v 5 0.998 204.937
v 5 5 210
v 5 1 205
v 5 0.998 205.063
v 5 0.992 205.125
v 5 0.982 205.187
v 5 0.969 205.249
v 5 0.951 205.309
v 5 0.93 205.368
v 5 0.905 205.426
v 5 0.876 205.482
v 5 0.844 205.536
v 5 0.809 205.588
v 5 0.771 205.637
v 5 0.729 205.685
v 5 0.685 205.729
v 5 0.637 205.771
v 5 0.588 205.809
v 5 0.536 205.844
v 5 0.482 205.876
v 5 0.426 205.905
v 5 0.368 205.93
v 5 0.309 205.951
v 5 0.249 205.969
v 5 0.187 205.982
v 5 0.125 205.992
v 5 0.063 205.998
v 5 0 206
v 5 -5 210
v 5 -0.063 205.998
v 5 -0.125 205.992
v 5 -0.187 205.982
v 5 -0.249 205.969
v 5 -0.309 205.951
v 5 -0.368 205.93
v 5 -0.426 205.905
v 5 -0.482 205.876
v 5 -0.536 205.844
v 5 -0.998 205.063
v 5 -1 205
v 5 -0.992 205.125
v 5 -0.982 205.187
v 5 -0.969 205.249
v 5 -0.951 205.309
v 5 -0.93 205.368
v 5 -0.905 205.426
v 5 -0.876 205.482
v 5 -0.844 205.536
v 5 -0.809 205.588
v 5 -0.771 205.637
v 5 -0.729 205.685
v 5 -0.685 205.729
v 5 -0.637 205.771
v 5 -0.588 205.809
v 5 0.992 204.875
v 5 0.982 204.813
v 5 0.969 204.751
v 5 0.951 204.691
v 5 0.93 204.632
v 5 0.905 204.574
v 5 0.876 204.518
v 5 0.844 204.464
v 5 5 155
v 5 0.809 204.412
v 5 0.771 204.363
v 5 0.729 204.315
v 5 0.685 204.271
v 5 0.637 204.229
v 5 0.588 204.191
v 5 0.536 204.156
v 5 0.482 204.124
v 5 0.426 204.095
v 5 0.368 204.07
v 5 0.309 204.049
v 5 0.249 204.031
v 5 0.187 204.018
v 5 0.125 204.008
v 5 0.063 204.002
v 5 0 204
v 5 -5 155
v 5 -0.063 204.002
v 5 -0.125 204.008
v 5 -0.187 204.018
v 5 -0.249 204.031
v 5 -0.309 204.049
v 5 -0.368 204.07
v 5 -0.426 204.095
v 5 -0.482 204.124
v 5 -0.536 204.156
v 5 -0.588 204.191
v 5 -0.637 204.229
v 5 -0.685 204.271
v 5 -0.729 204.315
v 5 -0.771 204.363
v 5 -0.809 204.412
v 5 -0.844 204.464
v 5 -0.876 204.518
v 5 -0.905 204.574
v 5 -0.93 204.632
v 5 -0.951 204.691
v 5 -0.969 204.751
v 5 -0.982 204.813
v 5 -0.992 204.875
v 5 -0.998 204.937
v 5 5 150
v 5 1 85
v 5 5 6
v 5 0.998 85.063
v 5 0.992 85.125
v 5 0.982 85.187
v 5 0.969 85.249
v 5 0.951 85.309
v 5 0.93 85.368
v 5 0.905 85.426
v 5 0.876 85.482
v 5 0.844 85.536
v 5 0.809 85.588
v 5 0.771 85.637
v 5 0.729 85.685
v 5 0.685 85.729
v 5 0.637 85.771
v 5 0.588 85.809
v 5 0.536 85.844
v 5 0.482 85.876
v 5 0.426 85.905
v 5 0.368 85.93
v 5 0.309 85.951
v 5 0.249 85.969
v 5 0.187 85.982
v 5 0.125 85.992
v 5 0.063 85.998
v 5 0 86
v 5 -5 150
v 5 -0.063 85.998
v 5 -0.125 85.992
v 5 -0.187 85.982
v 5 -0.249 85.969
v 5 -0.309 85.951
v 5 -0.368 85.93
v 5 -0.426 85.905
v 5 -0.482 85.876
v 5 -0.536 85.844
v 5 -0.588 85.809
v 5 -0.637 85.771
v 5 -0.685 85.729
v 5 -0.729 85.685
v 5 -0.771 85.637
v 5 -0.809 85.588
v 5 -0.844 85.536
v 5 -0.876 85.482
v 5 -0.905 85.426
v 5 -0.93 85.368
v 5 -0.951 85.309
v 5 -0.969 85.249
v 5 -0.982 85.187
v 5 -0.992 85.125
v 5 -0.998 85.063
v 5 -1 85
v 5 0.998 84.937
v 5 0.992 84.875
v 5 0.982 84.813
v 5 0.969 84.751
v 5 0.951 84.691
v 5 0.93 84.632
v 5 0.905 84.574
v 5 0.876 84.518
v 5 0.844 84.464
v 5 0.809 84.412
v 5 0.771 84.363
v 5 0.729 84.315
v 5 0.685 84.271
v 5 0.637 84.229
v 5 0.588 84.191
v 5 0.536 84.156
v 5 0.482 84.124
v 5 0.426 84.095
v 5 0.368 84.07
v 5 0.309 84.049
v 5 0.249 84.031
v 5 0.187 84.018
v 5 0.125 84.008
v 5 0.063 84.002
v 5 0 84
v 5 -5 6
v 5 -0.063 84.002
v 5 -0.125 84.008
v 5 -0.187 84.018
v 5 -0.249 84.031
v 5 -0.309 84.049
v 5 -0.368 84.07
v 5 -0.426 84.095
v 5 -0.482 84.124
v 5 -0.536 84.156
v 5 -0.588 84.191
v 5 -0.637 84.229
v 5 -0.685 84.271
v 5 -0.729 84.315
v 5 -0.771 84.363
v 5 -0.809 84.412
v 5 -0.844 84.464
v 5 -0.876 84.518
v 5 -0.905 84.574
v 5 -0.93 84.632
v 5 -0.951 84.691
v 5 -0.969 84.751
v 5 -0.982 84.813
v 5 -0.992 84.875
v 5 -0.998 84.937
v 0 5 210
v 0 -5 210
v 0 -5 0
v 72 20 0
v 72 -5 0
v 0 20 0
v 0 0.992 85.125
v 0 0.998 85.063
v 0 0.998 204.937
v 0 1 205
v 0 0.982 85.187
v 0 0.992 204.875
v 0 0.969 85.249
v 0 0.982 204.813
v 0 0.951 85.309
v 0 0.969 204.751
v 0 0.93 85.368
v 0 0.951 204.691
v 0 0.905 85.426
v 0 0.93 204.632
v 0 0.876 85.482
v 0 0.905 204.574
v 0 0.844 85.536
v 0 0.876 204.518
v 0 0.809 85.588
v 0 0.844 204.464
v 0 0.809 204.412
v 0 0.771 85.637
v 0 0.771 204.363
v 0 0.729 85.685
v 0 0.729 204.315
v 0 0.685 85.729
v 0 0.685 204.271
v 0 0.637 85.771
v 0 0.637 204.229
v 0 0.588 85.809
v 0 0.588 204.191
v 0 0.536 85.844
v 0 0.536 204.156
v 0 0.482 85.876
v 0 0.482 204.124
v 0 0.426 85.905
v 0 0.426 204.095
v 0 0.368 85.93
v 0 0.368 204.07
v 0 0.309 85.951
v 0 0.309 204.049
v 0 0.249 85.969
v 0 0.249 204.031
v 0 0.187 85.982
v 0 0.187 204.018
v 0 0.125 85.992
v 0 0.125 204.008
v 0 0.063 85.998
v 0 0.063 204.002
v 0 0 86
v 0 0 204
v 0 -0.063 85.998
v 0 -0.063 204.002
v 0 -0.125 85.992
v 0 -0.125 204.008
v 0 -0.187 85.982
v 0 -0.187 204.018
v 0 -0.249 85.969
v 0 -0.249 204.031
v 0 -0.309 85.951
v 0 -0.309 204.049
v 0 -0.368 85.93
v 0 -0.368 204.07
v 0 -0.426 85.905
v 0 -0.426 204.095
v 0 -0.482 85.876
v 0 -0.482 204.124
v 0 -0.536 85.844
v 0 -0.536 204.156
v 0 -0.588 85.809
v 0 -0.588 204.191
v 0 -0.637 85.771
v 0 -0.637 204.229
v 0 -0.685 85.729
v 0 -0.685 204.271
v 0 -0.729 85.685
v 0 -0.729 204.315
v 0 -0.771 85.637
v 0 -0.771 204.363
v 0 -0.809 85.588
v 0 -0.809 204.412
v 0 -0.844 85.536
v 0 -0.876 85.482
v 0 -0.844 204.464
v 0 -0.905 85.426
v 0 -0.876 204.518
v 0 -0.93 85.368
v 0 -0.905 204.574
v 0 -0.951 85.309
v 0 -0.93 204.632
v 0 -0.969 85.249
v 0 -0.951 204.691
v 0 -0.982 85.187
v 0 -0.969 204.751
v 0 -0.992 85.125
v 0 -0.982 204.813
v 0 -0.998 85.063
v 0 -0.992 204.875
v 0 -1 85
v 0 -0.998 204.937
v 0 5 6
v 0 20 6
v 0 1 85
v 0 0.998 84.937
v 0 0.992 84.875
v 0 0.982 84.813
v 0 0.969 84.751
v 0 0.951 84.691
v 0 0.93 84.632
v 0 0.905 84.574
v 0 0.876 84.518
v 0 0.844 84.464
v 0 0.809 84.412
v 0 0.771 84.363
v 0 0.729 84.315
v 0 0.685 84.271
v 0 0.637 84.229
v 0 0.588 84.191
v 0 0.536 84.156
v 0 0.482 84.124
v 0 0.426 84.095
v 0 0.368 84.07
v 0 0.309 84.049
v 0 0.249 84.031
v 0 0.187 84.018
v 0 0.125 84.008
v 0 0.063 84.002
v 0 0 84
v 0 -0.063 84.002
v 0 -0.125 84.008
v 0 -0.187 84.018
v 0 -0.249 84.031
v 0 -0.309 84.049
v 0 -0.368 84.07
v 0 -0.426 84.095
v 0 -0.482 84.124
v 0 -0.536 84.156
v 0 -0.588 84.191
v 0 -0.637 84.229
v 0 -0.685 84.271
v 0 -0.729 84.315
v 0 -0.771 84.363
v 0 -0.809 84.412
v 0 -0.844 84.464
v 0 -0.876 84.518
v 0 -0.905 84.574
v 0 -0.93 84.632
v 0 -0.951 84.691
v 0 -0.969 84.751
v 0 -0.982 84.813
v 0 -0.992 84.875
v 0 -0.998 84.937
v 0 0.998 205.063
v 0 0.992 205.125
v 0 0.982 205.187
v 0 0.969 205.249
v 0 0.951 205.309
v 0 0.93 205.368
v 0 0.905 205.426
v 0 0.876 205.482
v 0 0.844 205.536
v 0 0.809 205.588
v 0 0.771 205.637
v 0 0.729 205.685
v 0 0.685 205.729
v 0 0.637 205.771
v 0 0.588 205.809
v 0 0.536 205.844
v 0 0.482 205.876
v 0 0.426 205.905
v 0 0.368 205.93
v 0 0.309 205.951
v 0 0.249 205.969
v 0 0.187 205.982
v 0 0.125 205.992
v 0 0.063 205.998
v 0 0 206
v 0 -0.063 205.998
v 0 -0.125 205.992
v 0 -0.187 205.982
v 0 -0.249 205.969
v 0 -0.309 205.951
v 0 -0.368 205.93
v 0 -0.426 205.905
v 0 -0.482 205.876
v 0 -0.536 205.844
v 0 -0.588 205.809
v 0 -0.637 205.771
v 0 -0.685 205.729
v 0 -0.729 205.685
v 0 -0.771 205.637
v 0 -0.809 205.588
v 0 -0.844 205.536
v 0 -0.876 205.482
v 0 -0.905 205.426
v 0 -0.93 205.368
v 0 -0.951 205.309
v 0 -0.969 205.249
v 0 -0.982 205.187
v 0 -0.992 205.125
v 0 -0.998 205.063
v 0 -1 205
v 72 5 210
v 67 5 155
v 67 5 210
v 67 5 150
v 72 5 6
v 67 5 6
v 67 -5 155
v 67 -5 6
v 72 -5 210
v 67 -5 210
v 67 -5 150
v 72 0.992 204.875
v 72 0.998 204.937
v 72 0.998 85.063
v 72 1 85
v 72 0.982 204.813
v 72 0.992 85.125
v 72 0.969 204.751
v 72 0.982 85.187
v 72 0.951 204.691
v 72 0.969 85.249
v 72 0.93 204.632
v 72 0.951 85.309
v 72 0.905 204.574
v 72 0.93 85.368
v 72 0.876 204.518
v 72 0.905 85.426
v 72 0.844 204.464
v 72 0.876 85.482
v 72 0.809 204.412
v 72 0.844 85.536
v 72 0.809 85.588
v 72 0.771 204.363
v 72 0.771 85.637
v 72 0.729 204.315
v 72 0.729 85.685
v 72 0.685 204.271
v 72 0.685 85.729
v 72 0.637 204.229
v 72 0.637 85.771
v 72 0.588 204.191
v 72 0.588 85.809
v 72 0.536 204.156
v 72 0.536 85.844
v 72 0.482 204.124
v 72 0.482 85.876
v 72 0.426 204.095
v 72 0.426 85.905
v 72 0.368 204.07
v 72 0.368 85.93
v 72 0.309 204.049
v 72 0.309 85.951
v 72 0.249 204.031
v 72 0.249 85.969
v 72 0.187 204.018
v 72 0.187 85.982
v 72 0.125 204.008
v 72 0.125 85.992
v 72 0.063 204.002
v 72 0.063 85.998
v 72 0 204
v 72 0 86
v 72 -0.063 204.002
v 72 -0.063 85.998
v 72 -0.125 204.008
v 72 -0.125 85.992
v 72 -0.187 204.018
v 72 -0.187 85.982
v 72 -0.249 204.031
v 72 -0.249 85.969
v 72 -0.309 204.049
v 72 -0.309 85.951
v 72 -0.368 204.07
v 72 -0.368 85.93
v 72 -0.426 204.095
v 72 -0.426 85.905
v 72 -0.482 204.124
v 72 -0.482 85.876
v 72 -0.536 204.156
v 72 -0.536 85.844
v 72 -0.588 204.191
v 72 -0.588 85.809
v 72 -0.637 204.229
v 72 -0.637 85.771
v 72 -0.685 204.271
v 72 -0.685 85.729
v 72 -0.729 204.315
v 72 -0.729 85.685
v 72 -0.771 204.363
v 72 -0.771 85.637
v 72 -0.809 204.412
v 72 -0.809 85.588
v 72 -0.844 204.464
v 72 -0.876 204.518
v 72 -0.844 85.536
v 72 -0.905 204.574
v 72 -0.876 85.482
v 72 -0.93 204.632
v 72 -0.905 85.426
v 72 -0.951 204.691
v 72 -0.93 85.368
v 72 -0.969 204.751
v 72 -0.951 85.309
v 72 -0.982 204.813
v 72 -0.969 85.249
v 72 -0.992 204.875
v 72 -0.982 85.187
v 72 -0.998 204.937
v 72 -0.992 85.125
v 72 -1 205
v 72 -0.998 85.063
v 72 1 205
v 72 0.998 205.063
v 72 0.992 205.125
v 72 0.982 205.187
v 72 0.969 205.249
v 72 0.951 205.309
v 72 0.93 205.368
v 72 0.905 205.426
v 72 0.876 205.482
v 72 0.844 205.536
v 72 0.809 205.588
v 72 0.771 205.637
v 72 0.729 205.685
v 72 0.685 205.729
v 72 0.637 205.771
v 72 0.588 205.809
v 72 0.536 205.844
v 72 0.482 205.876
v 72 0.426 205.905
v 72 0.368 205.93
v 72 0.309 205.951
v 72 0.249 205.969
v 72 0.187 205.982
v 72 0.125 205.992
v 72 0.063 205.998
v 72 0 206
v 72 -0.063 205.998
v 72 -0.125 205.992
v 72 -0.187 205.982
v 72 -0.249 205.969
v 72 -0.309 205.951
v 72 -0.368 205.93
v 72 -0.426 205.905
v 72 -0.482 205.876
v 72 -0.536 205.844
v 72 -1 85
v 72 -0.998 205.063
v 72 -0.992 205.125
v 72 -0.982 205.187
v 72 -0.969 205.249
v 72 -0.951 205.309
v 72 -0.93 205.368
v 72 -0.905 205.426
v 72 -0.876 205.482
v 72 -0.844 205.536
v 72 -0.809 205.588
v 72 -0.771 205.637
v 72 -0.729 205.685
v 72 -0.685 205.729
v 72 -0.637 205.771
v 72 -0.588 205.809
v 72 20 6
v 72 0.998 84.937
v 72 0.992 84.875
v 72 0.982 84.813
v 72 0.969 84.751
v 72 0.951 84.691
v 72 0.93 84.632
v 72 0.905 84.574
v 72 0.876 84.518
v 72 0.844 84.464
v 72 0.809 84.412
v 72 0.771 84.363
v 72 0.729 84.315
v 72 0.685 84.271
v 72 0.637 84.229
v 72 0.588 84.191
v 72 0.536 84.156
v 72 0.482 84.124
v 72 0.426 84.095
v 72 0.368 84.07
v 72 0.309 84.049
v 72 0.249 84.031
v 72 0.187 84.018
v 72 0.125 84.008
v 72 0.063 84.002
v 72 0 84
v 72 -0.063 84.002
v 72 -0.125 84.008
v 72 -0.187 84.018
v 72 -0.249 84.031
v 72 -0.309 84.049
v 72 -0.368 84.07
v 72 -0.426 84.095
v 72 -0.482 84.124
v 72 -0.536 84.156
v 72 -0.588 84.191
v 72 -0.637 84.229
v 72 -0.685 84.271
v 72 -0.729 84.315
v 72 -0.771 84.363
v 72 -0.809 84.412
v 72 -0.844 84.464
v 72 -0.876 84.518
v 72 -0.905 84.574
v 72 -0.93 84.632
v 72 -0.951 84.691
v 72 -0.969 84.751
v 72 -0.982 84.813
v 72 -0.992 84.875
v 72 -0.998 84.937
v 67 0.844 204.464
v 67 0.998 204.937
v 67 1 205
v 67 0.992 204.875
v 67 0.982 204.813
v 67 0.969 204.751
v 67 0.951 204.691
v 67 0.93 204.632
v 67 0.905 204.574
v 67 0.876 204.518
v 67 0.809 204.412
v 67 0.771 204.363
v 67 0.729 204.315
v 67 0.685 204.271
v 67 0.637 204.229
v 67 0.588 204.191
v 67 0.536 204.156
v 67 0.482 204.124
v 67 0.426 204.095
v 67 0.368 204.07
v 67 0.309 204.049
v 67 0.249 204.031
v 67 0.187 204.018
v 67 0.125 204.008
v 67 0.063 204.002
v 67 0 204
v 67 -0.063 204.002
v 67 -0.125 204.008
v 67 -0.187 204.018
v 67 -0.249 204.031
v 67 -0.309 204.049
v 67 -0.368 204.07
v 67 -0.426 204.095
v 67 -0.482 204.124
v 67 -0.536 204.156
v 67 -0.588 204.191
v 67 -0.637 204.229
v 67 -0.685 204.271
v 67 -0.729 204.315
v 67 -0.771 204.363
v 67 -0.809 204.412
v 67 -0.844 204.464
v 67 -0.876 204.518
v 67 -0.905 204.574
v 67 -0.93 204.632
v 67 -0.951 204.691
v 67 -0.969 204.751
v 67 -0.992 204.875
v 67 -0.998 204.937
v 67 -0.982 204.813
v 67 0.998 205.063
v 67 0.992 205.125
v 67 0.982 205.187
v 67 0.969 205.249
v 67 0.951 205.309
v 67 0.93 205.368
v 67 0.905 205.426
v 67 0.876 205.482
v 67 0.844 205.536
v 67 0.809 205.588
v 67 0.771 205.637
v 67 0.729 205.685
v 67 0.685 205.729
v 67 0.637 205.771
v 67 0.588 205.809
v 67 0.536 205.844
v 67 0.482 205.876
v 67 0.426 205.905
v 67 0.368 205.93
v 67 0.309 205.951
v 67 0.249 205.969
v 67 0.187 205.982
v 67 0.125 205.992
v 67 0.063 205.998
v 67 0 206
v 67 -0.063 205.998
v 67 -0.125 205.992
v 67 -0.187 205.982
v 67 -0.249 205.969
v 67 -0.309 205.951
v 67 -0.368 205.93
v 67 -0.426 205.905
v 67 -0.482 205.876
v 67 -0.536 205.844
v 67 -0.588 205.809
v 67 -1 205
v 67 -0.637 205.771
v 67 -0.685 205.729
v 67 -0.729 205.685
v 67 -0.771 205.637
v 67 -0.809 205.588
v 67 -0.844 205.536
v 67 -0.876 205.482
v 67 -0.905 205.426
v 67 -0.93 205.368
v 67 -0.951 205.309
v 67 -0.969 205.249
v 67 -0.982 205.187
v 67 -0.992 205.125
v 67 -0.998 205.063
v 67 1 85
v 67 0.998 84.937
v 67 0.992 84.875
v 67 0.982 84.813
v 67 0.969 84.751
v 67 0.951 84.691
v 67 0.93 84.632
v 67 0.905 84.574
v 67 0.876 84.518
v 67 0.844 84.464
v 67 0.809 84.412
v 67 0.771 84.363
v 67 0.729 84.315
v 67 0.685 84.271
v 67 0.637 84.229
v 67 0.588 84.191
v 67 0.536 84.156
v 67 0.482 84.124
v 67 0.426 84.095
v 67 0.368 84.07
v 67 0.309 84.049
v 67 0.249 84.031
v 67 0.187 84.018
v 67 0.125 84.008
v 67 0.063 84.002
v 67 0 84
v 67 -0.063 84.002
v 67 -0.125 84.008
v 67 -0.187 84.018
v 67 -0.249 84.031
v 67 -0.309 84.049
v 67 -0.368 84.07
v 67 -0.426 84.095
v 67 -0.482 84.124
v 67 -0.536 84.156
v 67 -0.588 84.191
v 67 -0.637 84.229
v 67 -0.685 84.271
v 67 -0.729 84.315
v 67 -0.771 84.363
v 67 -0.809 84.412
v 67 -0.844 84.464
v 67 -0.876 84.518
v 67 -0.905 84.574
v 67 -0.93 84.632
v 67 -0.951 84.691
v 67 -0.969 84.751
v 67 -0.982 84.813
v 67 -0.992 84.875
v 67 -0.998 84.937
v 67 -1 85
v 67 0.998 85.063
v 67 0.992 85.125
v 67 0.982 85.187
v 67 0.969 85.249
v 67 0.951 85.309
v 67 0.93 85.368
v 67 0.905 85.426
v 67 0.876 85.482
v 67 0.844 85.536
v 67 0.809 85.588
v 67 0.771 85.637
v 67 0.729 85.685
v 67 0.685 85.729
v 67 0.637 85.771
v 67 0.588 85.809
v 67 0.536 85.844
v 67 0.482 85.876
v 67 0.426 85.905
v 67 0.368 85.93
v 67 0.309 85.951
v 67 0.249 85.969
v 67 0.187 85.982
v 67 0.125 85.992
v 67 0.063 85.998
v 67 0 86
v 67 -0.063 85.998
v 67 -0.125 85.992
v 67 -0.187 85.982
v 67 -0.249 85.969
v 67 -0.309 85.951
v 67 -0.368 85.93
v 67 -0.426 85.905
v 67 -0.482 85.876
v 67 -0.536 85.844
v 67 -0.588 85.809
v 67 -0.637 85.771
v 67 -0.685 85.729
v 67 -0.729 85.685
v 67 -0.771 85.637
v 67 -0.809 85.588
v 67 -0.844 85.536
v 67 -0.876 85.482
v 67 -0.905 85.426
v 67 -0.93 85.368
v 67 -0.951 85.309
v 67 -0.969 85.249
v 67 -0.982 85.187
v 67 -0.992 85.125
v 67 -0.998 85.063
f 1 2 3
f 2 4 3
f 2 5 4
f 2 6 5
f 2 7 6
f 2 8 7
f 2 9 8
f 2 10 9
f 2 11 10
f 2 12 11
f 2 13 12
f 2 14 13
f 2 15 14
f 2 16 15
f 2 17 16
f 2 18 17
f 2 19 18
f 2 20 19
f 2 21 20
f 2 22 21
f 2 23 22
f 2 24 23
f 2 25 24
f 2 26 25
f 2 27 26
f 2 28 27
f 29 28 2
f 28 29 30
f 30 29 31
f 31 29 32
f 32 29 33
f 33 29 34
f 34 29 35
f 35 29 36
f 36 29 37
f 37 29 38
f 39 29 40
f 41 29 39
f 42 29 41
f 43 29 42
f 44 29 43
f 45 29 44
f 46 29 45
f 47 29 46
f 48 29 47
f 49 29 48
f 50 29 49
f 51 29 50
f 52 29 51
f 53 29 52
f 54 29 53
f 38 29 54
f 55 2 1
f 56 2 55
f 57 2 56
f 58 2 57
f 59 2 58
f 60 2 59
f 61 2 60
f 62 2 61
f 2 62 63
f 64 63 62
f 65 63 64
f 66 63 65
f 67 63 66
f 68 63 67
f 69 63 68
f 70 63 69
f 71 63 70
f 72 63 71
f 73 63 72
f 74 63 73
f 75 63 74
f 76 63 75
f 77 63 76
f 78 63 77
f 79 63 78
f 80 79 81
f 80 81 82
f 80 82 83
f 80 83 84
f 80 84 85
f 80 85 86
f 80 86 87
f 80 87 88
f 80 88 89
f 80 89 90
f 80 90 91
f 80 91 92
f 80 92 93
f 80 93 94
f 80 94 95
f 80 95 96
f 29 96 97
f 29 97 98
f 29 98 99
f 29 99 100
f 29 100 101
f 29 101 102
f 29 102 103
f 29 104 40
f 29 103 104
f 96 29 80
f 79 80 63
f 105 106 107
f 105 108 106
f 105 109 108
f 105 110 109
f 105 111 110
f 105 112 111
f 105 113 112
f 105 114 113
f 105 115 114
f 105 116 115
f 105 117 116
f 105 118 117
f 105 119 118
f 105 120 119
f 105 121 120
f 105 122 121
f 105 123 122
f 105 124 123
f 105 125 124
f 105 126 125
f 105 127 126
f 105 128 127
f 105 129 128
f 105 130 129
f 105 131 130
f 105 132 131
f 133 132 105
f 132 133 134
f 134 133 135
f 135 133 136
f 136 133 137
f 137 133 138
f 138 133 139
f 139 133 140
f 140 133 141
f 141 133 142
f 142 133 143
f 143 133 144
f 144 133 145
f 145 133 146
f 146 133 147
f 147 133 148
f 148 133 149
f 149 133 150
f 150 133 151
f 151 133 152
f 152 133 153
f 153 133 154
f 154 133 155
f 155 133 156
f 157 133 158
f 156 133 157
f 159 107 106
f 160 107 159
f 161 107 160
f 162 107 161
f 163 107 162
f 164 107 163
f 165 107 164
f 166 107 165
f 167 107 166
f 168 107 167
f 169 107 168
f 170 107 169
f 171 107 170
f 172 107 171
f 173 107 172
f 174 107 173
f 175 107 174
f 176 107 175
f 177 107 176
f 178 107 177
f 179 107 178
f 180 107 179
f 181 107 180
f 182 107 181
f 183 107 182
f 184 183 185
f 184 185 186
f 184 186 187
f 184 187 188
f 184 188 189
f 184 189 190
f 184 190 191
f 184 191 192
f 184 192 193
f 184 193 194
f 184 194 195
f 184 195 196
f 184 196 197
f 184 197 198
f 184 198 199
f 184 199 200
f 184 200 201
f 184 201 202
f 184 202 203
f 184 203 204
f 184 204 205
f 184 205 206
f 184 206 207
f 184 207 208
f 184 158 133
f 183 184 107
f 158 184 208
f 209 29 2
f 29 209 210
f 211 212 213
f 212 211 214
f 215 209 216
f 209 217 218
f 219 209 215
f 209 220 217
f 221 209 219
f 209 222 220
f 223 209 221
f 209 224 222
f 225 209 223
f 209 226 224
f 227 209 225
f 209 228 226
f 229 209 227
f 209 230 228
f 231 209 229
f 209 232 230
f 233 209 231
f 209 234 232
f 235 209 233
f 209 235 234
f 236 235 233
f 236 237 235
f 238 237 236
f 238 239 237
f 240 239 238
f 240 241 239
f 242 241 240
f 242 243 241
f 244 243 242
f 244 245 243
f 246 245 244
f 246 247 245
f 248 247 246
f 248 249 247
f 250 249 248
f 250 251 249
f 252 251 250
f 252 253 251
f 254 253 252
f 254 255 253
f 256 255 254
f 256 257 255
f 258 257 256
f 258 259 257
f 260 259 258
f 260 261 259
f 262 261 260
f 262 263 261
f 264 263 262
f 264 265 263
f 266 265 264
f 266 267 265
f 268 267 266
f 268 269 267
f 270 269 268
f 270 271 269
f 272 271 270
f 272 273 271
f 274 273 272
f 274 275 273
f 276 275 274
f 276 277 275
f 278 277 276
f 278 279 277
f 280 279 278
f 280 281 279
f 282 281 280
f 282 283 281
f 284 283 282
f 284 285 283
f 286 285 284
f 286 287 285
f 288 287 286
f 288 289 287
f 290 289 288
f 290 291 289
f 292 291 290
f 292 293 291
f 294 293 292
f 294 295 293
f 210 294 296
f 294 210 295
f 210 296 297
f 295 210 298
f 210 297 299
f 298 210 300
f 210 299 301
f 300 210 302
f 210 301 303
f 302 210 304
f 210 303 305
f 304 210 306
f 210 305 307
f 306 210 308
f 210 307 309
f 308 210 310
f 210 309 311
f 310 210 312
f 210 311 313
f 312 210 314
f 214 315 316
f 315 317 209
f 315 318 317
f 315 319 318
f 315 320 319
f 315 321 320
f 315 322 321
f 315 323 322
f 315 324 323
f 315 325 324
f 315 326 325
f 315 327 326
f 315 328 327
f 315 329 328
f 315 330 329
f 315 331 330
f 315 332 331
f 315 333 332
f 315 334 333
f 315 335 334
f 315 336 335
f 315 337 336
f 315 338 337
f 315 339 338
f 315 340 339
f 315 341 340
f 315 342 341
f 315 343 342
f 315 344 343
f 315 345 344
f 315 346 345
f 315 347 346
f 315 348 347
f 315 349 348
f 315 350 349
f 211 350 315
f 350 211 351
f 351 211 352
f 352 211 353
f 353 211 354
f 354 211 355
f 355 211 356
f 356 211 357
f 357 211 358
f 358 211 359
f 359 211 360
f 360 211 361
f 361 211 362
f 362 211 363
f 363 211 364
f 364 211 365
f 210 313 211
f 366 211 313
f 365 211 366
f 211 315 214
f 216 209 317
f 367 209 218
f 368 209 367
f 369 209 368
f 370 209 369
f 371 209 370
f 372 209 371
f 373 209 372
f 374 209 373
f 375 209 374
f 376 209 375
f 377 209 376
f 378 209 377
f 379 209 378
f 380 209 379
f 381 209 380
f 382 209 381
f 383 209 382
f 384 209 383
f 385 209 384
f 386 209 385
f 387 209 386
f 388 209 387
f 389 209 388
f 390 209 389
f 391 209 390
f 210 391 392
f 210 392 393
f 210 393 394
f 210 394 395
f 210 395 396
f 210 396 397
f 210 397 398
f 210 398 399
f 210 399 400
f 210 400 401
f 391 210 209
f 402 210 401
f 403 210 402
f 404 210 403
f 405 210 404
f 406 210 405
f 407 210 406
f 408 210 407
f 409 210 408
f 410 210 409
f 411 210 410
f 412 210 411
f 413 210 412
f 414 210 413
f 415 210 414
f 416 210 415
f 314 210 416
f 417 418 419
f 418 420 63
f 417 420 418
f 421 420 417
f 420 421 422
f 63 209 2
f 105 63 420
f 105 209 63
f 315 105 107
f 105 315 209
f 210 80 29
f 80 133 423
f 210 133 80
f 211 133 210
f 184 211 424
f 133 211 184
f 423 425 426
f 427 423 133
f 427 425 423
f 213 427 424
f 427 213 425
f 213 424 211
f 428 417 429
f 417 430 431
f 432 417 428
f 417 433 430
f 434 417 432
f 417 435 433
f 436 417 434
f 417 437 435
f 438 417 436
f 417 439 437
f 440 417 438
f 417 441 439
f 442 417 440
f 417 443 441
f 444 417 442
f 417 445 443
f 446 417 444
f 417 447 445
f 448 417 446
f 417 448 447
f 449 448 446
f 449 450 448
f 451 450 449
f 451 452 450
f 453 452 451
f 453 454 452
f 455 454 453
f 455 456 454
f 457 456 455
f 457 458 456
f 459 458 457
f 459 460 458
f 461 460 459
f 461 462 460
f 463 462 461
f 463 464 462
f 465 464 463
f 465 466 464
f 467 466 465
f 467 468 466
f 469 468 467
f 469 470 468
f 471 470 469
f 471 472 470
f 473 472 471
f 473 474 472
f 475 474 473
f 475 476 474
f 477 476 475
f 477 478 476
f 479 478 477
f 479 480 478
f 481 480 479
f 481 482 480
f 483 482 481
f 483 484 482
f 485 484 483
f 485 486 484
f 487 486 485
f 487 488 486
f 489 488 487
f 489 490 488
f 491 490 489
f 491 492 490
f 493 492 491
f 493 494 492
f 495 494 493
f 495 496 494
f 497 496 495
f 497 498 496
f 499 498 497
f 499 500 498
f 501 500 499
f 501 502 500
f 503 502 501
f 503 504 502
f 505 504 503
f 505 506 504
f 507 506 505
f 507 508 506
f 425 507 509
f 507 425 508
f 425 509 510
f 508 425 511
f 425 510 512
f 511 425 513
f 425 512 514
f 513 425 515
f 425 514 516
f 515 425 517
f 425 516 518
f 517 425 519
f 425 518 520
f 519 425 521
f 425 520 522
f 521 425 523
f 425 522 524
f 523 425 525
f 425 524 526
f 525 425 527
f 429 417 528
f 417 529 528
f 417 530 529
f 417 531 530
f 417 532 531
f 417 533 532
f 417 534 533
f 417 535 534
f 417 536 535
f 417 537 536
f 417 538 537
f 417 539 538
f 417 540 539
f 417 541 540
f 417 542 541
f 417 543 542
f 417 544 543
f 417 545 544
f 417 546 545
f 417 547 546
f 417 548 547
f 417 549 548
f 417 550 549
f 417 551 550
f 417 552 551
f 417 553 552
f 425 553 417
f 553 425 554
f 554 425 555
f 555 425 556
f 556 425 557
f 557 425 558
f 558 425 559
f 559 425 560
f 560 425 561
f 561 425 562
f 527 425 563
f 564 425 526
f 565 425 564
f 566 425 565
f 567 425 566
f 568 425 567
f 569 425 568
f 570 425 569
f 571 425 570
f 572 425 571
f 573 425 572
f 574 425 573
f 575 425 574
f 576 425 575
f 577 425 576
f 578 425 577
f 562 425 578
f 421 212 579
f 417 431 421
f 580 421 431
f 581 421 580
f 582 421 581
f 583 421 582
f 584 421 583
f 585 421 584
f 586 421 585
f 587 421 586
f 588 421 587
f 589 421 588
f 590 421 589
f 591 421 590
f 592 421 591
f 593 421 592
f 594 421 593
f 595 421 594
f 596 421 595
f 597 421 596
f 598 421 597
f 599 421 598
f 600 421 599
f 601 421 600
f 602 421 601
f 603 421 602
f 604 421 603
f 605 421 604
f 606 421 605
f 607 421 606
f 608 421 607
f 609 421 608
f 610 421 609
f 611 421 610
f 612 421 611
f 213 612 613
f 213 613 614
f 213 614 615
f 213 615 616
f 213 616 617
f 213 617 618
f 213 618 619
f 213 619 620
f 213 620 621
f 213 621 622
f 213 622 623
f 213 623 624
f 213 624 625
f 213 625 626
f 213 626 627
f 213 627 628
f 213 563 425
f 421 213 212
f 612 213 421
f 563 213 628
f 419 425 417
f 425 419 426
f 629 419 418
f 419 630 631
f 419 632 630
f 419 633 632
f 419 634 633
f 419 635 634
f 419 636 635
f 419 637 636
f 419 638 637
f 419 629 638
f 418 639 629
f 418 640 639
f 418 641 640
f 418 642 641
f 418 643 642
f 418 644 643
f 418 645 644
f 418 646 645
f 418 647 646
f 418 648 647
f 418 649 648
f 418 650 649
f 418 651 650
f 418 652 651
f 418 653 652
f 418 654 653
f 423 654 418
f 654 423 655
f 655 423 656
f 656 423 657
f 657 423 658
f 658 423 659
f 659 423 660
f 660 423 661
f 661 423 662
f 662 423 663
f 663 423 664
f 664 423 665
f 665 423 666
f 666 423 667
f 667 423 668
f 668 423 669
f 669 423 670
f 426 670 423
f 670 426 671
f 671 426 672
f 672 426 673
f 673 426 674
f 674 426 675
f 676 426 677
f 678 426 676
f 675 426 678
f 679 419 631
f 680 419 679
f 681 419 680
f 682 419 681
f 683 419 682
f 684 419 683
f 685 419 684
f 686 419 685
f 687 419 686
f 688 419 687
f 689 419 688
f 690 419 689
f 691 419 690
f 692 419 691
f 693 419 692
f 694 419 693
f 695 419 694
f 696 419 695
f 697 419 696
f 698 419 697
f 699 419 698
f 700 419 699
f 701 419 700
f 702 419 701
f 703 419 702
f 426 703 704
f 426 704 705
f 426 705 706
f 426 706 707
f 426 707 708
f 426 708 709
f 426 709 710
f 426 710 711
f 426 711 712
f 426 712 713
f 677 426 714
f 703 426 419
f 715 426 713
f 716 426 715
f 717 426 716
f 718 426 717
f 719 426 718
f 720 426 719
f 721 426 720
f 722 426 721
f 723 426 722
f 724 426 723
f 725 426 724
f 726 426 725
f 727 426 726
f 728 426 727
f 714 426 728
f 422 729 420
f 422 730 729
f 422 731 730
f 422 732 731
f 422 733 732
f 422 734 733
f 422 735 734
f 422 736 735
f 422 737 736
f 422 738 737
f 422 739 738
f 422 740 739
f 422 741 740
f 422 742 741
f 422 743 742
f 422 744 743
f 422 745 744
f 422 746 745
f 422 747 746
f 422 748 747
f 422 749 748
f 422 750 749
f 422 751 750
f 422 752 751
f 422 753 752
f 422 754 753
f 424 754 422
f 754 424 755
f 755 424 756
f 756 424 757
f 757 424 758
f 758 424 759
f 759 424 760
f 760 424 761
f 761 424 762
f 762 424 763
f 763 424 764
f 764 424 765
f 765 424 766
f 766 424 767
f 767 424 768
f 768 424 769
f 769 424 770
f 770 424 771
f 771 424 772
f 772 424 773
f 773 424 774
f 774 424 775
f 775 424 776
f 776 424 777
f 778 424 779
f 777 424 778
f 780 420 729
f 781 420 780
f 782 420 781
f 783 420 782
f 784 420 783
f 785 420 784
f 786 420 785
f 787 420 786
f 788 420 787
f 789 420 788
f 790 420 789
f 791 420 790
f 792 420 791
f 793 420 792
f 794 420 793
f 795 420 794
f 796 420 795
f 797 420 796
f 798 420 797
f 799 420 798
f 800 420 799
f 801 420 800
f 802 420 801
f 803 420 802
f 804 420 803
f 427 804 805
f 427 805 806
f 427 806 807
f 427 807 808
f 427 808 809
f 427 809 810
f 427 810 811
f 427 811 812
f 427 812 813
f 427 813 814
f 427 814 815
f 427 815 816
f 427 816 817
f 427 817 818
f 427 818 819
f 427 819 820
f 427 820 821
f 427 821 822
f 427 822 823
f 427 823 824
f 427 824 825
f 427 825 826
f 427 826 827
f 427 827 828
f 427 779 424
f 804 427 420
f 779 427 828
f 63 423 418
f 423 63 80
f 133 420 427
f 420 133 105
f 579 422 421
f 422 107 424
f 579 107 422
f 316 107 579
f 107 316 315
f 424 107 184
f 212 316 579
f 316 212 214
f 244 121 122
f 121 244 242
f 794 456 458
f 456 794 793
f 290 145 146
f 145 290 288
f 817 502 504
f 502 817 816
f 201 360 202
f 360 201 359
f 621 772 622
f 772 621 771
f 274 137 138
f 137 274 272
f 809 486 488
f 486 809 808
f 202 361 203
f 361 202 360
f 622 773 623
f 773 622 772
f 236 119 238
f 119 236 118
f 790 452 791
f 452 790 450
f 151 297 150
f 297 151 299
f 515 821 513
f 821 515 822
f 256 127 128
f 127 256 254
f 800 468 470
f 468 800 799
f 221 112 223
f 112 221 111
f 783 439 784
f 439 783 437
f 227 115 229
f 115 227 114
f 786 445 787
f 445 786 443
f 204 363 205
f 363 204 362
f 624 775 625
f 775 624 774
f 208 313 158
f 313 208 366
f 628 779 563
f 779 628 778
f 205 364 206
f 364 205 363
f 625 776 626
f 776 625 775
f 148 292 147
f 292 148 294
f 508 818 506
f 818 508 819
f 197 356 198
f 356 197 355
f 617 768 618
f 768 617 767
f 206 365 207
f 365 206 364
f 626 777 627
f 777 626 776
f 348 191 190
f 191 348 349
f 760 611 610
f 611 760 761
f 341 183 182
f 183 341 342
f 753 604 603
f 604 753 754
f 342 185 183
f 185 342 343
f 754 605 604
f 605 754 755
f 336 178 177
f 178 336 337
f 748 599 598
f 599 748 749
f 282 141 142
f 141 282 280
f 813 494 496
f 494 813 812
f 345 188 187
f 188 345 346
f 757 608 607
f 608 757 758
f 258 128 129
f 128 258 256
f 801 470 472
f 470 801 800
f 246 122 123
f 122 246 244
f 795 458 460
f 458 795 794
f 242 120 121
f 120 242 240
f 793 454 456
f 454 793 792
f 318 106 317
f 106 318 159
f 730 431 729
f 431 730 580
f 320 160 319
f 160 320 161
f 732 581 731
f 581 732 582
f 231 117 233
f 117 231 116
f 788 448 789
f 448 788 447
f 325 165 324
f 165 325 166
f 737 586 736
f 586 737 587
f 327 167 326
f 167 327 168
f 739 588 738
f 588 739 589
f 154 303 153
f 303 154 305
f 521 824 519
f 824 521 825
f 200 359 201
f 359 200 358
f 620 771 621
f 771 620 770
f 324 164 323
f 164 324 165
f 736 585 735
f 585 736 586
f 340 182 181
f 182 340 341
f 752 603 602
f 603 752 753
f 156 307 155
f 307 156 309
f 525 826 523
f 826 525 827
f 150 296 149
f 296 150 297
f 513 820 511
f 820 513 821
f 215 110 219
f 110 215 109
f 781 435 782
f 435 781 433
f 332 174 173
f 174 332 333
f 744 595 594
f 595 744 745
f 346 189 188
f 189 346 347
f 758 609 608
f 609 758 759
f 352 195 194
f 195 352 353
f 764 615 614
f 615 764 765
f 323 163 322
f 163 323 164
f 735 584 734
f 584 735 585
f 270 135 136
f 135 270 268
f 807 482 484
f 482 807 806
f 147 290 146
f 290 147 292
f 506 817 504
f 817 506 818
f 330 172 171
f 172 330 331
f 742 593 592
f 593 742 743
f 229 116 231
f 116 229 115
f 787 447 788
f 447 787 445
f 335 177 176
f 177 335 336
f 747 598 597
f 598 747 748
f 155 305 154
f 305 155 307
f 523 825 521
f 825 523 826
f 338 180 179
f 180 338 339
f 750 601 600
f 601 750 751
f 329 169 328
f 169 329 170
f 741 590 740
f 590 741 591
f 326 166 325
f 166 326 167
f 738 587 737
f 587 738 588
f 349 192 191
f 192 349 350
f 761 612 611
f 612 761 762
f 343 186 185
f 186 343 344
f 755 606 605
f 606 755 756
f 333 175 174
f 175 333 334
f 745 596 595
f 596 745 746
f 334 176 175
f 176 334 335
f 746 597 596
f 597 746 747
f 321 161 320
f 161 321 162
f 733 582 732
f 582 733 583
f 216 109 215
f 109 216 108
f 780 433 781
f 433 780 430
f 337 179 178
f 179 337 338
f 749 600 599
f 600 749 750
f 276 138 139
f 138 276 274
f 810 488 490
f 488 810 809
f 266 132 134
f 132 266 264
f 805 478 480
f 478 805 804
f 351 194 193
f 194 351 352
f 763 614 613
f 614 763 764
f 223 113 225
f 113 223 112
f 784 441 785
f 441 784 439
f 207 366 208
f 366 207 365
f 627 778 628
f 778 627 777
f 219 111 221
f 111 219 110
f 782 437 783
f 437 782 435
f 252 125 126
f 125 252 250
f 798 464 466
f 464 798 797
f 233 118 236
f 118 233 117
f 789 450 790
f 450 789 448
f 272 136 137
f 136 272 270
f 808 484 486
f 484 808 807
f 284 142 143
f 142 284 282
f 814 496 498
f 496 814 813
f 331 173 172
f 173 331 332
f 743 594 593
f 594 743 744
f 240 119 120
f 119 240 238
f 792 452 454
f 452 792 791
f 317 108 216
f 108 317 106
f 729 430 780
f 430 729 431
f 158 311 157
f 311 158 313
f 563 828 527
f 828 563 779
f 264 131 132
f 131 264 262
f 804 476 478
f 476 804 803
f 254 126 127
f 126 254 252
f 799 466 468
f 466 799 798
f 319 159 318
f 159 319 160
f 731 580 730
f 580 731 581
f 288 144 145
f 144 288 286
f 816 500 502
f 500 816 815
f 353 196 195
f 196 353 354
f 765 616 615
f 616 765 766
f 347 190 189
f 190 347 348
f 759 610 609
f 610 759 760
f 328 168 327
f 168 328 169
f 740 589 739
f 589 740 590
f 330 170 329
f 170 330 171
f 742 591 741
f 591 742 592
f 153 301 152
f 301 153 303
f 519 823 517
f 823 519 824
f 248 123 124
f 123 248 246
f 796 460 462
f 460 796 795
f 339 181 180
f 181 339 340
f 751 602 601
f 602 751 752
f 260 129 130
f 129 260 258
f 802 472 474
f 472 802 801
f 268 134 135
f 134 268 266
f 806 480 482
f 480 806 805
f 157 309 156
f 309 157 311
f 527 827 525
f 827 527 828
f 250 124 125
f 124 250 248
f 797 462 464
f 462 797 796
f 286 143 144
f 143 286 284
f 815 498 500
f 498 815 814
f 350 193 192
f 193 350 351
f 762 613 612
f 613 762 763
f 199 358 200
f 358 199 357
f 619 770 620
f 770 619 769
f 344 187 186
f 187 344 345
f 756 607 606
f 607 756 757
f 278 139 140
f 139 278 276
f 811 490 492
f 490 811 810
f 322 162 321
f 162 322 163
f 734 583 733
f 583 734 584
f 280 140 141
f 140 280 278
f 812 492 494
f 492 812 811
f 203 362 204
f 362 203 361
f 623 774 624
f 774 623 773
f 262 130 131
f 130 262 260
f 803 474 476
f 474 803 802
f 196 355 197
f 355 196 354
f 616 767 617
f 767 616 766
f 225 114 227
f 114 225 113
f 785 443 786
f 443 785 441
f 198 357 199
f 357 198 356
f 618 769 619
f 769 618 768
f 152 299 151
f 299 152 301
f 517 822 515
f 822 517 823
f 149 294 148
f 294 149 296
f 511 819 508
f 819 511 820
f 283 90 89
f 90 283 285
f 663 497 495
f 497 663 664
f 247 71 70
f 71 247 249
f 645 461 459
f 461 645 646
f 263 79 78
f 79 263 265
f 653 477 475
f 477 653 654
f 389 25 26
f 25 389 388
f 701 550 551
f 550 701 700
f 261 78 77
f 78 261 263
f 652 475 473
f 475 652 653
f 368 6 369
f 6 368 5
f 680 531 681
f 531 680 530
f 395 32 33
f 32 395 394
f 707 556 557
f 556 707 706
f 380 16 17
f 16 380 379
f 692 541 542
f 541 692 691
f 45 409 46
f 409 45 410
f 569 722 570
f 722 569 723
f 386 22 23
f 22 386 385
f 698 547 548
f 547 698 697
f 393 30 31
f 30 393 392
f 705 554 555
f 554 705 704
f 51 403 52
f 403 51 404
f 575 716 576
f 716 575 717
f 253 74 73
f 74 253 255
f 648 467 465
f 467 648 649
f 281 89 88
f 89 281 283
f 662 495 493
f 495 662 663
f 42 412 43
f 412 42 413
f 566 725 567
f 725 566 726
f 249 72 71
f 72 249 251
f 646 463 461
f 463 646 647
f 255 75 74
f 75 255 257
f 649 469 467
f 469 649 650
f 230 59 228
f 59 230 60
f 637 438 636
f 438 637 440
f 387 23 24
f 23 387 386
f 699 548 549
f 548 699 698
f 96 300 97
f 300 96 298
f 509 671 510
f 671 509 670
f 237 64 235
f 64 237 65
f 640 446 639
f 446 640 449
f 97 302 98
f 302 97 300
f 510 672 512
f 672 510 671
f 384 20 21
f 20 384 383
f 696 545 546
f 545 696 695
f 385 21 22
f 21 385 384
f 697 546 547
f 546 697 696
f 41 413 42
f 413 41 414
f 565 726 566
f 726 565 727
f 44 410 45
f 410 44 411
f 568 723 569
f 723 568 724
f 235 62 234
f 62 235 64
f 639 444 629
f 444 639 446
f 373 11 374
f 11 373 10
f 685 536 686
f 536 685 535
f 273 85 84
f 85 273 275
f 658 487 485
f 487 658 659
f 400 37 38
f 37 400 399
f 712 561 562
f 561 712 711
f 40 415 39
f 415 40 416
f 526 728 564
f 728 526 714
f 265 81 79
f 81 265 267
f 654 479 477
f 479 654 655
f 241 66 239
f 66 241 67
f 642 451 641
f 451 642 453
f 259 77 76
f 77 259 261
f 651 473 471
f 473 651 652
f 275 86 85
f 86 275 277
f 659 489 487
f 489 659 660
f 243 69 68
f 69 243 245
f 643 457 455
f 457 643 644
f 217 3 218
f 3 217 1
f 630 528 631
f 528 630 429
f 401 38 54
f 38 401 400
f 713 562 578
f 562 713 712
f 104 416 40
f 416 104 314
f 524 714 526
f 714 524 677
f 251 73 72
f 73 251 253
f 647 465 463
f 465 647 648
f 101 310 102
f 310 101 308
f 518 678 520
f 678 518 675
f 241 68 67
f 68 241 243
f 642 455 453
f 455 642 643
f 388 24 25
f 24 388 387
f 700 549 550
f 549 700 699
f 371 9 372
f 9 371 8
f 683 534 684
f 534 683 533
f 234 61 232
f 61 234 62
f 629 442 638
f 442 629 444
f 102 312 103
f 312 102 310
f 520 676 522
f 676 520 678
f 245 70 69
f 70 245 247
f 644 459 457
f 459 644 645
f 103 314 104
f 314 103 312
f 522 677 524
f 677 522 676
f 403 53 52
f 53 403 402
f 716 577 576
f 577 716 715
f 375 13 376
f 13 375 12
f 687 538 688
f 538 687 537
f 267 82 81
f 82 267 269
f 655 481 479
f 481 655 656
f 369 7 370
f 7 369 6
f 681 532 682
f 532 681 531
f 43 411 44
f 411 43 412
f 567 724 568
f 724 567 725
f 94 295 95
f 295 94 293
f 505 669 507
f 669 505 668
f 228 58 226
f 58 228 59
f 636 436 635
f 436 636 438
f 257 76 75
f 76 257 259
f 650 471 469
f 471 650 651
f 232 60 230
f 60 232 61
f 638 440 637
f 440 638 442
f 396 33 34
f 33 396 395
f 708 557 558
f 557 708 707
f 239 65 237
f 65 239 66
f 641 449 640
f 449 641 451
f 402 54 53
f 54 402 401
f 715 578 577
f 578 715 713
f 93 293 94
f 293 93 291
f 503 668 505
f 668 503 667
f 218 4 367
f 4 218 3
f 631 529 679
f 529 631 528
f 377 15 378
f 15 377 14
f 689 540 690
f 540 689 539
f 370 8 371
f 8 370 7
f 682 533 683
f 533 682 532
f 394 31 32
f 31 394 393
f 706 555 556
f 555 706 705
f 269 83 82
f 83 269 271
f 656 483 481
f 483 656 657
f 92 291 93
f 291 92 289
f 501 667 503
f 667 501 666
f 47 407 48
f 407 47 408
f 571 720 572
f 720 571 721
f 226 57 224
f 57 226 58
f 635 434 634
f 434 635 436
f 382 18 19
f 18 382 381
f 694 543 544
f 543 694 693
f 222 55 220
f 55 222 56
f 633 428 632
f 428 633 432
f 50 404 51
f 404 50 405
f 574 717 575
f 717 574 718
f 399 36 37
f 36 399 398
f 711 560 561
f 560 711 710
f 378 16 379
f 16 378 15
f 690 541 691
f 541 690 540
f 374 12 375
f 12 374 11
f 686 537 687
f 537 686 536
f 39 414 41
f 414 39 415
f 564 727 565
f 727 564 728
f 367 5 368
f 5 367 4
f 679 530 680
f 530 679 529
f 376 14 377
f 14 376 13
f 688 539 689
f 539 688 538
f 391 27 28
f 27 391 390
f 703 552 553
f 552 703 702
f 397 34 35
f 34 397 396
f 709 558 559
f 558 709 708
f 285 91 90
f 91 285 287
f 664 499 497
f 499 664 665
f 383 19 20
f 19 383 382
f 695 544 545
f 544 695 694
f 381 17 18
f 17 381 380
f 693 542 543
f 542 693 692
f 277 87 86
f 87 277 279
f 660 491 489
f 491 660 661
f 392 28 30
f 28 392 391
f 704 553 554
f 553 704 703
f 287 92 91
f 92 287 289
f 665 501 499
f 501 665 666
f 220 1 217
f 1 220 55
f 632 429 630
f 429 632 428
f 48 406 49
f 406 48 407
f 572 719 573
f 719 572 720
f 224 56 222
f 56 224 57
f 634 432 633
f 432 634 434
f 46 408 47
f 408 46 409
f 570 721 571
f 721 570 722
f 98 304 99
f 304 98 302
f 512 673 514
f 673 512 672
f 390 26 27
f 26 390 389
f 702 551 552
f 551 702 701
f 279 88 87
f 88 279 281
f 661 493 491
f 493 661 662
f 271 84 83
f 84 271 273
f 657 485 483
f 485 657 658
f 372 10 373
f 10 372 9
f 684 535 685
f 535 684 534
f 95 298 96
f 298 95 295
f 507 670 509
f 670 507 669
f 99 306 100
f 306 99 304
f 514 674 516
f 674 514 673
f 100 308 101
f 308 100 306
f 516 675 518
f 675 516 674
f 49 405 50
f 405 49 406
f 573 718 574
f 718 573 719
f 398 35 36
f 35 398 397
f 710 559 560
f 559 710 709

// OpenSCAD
difference(){
	union(){
        translate([0,-5,0]){
           cube([5,10,210], center=false);
       }
       translate([0+5+62,-5,0]){
           cube([5,10,210], center=false);
       }

       translate([0,-5,150]){
           cube([72,10,5], center=false);
       }


       translate([0,-5,00]){
           cube([72,25,6], center=false);
       }

	}
	union() {       
			   
       translate([-30,0,85]){
            rotate(a = [0,90,0]) {
                cylinder(h=600, r=1, $fn=100, center=false);
            }
       }			   
		   
       translate([-30,0,205]){
            rotate(a = [0,90,0]) {
                cylinder(h=600, r=1, $fn=100, center=false);
            }
       }			   


			
       translate([5+42/2,10,205]){
            rotate(a = [90,0,0]) {
                cylinder(h=600, r=1, $fn=100, center=false);
            }
       }			   
   


        
	}
}
